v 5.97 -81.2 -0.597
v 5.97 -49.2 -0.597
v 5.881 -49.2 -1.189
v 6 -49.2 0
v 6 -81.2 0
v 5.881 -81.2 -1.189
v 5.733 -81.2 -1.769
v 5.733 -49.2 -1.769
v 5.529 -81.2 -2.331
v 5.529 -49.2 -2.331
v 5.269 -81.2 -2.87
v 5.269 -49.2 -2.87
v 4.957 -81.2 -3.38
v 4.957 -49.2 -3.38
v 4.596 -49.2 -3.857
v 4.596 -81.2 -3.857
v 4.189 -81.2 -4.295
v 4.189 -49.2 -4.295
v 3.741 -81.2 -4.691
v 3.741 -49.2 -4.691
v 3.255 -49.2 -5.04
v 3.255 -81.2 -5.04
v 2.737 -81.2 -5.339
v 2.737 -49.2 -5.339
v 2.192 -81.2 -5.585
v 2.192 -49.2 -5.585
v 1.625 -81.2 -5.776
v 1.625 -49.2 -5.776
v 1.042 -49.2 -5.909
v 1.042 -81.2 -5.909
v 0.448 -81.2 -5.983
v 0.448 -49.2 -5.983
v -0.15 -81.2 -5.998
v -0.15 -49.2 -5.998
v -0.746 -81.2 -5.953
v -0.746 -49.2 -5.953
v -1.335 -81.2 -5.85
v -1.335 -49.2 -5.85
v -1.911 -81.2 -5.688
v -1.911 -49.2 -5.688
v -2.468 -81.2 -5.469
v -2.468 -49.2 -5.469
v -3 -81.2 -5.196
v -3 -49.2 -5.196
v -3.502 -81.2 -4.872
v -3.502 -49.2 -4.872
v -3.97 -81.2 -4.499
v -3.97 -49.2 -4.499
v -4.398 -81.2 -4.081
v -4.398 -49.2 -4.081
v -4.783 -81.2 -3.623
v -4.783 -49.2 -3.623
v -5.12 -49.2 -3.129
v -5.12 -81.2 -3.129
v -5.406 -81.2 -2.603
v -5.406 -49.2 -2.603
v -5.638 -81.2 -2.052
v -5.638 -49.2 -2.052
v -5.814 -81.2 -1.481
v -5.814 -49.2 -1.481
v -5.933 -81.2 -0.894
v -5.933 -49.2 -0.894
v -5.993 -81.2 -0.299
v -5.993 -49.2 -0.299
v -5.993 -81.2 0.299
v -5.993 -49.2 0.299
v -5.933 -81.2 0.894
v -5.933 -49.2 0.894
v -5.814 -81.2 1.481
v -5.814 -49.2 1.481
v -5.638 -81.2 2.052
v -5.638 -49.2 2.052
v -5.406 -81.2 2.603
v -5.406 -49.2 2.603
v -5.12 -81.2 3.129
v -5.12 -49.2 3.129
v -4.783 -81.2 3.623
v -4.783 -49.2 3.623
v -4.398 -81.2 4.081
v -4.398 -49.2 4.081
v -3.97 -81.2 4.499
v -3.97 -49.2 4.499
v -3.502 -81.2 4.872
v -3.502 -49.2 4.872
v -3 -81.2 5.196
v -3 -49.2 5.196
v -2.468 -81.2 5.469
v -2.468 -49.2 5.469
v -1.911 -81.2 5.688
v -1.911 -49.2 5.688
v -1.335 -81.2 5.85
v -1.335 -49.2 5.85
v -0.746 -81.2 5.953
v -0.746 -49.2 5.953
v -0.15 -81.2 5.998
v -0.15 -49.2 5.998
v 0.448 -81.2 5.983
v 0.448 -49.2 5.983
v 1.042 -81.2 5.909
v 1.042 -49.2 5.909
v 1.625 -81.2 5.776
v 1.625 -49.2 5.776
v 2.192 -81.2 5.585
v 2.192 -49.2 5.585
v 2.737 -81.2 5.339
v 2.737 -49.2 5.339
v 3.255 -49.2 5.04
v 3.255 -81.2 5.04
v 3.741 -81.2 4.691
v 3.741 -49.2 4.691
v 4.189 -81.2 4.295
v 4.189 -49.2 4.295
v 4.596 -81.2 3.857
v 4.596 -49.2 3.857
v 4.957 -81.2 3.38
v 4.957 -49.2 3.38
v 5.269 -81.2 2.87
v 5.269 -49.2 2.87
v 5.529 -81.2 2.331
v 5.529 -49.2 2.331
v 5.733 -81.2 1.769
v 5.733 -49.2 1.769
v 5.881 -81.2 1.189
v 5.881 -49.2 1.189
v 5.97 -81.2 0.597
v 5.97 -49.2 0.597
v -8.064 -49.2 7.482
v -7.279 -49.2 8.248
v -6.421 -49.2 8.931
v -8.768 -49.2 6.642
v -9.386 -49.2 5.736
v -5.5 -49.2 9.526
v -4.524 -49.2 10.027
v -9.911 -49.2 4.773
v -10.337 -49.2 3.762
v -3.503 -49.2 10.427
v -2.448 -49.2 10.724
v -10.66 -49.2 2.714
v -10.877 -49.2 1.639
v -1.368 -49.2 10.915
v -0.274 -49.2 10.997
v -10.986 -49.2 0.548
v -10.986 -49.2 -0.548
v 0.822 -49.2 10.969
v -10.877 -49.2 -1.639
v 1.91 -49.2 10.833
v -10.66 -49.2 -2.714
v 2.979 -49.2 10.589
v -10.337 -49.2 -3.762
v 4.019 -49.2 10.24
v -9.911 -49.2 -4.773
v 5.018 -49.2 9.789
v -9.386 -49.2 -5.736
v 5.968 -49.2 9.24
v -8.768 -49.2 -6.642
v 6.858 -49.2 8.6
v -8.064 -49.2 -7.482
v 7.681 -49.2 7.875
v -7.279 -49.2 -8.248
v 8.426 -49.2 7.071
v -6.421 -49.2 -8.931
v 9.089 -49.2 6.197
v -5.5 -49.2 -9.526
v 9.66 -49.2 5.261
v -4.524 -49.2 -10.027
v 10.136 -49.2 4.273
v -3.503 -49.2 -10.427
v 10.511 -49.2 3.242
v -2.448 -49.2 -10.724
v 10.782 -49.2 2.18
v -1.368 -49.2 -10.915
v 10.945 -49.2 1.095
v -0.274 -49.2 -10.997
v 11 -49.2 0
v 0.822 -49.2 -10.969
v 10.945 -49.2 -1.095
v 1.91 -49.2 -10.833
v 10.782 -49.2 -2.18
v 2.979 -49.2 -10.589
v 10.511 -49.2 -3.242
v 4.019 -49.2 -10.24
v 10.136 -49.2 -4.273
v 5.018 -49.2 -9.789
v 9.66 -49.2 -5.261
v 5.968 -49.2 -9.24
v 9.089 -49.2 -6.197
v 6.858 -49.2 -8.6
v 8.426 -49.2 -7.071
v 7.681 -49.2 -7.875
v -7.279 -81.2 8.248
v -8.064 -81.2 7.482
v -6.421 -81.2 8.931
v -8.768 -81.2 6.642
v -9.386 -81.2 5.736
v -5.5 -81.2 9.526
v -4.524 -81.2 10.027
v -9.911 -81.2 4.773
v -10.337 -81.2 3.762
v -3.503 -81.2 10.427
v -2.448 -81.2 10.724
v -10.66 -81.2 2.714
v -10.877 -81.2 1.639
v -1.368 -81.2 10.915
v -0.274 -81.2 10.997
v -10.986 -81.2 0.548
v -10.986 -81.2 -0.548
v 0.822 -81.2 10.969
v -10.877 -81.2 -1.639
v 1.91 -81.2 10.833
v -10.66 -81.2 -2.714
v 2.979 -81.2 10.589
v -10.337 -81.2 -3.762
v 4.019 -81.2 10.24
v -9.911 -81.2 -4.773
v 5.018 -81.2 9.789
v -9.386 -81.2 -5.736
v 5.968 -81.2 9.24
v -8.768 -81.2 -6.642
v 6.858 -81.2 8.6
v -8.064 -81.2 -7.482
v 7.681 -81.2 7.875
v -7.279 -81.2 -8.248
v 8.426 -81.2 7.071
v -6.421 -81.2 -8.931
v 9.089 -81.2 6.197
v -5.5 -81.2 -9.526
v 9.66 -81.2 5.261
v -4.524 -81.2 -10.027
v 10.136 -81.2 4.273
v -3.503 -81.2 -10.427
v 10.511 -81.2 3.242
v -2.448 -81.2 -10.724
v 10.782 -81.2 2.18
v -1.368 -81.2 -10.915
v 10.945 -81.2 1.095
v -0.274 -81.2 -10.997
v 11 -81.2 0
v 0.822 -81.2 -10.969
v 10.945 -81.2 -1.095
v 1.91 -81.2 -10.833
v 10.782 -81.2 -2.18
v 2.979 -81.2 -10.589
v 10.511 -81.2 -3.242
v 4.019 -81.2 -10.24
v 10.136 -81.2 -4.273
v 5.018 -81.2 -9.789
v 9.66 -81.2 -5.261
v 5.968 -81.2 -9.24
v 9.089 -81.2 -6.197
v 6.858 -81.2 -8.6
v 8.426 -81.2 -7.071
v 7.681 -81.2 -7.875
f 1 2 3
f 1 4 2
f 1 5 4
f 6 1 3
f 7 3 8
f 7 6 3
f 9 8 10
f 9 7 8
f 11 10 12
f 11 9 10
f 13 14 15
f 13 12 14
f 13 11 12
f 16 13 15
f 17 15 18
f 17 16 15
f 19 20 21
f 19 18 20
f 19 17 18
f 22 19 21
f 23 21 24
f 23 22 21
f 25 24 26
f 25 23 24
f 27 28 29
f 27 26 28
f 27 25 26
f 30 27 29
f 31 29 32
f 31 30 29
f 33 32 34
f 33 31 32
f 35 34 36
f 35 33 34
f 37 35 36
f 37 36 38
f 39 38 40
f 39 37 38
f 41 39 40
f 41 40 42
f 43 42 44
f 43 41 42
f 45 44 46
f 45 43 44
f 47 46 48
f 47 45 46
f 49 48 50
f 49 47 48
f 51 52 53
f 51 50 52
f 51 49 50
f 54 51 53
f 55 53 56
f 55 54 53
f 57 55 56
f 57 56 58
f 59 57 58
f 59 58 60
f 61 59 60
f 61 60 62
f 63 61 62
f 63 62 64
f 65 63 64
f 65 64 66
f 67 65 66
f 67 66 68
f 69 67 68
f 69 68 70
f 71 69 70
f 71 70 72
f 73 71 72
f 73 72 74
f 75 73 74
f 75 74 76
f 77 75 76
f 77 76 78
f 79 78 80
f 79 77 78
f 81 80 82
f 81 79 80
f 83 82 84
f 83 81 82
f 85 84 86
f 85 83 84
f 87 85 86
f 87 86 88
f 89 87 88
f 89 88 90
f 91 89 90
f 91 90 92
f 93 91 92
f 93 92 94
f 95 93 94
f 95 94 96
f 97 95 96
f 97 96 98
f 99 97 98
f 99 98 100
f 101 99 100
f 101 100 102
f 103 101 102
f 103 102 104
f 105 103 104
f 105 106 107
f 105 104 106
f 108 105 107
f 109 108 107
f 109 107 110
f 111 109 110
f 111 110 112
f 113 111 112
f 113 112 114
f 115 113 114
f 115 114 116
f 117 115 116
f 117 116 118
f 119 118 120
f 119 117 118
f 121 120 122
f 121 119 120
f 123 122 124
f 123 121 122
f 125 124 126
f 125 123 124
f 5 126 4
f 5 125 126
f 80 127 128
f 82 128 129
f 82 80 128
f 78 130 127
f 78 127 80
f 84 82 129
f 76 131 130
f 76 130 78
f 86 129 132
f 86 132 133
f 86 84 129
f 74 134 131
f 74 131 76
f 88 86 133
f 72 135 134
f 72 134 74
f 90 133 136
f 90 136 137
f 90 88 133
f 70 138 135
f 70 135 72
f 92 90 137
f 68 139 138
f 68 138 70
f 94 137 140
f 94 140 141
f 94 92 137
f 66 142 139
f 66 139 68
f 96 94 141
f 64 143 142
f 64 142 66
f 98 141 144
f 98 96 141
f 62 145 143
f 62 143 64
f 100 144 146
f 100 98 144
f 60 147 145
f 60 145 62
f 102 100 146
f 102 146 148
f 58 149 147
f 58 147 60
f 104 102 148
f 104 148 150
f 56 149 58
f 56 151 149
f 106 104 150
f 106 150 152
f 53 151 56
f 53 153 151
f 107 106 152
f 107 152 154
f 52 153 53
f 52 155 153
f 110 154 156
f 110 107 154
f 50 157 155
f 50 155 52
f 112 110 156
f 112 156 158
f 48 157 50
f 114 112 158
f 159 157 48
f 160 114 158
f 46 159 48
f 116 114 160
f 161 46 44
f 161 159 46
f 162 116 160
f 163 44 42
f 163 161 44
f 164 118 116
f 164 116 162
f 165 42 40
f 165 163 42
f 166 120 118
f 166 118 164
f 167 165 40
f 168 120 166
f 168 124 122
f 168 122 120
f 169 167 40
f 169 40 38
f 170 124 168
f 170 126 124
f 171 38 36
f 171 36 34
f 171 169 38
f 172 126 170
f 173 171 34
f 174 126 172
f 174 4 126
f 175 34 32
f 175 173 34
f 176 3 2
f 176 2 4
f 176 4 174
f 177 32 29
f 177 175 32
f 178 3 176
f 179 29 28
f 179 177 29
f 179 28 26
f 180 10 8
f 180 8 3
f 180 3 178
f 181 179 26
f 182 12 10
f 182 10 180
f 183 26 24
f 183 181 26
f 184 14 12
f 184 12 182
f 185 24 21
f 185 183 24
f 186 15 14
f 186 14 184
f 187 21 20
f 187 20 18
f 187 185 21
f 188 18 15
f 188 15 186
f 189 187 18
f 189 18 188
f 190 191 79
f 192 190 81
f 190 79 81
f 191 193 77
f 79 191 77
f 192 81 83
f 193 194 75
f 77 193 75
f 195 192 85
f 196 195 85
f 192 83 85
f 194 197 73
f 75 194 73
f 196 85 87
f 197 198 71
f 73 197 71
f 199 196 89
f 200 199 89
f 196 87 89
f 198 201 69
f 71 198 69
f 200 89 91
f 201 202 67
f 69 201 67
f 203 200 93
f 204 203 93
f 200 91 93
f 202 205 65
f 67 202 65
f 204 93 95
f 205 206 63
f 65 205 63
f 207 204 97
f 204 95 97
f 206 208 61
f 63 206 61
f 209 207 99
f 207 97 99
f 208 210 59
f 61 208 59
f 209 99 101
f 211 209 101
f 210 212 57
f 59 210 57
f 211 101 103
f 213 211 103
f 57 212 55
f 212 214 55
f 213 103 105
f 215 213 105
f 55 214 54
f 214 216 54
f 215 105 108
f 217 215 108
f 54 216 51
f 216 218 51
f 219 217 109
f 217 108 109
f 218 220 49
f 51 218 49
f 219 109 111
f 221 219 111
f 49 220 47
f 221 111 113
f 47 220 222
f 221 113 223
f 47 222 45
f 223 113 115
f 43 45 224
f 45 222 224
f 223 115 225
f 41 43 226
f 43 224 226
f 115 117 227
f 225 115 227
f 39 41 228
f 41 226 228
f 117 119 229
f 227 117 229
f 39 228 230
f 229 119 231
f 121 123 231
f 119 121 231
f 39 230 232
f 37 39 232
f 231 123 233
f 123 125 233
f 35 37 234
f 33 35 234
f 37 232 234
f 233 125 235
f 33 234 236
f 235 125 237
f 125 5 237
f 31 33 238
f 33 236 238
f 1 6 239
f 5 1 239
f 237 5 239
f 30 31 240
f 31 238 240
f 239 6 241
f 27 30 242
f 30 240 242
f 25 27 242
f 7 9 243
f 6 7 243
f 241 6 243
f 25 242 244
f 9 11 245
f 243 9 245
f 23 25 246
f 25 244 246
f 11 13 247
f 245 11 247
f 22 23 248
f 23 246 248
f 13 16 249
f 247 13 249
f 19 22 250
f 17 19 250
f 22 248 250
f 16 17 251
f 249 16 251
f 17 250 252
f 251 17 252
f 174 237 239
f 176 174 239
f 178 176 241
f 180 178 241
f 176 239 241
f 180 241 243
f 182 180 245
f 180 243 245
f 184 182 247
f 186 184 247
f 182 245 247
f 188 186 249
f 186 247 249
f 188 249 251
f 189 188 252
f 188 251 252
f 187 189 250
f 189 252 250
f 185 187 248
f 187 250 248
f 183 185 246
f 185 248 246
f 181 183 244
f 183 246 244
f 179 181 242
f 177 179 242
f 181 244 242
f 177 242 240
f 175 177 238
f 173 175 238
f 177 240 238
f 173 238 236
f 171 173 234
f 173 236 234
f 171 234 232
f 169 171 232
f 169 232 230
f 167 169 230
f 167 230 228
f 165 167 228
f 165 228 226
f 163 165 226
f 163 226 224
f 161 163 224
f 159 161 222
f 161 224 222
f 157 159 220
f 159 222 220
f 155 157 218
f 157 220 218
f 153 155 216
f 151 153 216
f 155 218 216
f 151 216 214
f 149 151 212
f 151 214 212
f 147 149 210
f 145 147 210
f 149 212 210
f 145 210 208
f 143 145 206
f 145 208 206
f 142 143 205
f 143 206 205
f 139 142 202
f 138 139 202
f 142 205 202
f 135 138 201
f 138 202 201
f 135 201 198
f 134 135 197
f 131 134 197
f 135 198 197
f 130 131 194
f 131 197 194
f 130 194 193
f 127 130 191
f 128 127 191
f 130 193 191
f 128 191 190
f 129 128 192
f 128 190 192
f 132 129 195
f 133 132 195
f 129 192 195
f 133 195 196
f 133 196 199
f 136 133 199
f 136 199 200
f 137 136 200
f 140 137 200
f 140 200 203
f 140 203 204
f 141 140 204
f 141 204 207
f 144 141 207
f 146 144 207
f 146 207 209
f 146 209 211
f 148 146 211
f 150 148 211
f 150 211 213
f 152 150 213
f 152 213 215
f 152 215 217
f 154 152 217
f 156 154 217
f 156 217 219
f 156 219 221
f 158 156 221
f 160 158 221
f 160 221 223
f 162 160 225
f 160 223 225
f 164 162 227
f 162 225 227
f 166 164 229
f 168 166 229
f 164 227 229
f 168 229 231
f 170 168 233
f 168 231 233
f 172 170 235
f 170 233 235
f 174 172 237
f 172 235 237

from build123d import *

# Parameters (mm, degrees)
LM12UU_0_INT_R          = 6
LM12UU_0_INT_DEPTH      = 34
LM12UU_0_INT_ROLL_ANGLE = -90
LM12UU_0_EXT_R          = 11
LM12UU_0_EXT_DEPTH      = 32
LM12UU_0_EXT_ROLL_ANGLE = -90


with BuildPart() as lm12uu_0_int:
    # lm12uu_0_int → lm12uu_0_int (new body)
    with BuildSketch(Plane.XY):
        Circle(LM12UU_0_INT_R)
    extrude(amount=LM12UU_0_INT_DEPTH)


with BuildPart() as lm12uu_0_int_1:
    # lm12uu_0_int roll: moved
    add(lm12uu_0_int.part.rotate(Axis((0, 0, 0), (1, 0, 0)), LM12UU_0_INT_ROLL_ANGLE))


with BuildPart() as lm12uu_0_int_2:
    # lm12uu_0_int placement: moved
    add(lm12uu_0_int_1.part.moved(Location((0, -82.2, 0))))


with BuildPart() as lm12uu_0_body:
    # lm12uu_0_ext → lm12uu_0_ext (new body)
    with BuildSketch(Plane.XY):
        Circle(LM12UU_0_EXT_R)
    extrude(amount=LM12UU_0_EXT_DEPTH)


with BuildPart() as lm12uu_0_body_1:
    # lm12uu_0_ext roll: moved
    add(lm12uu_0_body.part.rotate(Axis((0, 0, 0), (1, 0, 0)), LM12UU_0_EXT_ROLL_ANGLE))


with BuildPart() as lm12uu_0_body_2:
    # lm12uu_0_ext placement: moved
    add(lm12uu_0_body_1.part.moved(Location((0, -81.2, 0))))

    # lm12uu_0: cut lm12uu_0_int
    add(lm12uu_0_int_2.part, mode=Mode.SUBTRACT)


solid = lm12uu_0_body_2.part
